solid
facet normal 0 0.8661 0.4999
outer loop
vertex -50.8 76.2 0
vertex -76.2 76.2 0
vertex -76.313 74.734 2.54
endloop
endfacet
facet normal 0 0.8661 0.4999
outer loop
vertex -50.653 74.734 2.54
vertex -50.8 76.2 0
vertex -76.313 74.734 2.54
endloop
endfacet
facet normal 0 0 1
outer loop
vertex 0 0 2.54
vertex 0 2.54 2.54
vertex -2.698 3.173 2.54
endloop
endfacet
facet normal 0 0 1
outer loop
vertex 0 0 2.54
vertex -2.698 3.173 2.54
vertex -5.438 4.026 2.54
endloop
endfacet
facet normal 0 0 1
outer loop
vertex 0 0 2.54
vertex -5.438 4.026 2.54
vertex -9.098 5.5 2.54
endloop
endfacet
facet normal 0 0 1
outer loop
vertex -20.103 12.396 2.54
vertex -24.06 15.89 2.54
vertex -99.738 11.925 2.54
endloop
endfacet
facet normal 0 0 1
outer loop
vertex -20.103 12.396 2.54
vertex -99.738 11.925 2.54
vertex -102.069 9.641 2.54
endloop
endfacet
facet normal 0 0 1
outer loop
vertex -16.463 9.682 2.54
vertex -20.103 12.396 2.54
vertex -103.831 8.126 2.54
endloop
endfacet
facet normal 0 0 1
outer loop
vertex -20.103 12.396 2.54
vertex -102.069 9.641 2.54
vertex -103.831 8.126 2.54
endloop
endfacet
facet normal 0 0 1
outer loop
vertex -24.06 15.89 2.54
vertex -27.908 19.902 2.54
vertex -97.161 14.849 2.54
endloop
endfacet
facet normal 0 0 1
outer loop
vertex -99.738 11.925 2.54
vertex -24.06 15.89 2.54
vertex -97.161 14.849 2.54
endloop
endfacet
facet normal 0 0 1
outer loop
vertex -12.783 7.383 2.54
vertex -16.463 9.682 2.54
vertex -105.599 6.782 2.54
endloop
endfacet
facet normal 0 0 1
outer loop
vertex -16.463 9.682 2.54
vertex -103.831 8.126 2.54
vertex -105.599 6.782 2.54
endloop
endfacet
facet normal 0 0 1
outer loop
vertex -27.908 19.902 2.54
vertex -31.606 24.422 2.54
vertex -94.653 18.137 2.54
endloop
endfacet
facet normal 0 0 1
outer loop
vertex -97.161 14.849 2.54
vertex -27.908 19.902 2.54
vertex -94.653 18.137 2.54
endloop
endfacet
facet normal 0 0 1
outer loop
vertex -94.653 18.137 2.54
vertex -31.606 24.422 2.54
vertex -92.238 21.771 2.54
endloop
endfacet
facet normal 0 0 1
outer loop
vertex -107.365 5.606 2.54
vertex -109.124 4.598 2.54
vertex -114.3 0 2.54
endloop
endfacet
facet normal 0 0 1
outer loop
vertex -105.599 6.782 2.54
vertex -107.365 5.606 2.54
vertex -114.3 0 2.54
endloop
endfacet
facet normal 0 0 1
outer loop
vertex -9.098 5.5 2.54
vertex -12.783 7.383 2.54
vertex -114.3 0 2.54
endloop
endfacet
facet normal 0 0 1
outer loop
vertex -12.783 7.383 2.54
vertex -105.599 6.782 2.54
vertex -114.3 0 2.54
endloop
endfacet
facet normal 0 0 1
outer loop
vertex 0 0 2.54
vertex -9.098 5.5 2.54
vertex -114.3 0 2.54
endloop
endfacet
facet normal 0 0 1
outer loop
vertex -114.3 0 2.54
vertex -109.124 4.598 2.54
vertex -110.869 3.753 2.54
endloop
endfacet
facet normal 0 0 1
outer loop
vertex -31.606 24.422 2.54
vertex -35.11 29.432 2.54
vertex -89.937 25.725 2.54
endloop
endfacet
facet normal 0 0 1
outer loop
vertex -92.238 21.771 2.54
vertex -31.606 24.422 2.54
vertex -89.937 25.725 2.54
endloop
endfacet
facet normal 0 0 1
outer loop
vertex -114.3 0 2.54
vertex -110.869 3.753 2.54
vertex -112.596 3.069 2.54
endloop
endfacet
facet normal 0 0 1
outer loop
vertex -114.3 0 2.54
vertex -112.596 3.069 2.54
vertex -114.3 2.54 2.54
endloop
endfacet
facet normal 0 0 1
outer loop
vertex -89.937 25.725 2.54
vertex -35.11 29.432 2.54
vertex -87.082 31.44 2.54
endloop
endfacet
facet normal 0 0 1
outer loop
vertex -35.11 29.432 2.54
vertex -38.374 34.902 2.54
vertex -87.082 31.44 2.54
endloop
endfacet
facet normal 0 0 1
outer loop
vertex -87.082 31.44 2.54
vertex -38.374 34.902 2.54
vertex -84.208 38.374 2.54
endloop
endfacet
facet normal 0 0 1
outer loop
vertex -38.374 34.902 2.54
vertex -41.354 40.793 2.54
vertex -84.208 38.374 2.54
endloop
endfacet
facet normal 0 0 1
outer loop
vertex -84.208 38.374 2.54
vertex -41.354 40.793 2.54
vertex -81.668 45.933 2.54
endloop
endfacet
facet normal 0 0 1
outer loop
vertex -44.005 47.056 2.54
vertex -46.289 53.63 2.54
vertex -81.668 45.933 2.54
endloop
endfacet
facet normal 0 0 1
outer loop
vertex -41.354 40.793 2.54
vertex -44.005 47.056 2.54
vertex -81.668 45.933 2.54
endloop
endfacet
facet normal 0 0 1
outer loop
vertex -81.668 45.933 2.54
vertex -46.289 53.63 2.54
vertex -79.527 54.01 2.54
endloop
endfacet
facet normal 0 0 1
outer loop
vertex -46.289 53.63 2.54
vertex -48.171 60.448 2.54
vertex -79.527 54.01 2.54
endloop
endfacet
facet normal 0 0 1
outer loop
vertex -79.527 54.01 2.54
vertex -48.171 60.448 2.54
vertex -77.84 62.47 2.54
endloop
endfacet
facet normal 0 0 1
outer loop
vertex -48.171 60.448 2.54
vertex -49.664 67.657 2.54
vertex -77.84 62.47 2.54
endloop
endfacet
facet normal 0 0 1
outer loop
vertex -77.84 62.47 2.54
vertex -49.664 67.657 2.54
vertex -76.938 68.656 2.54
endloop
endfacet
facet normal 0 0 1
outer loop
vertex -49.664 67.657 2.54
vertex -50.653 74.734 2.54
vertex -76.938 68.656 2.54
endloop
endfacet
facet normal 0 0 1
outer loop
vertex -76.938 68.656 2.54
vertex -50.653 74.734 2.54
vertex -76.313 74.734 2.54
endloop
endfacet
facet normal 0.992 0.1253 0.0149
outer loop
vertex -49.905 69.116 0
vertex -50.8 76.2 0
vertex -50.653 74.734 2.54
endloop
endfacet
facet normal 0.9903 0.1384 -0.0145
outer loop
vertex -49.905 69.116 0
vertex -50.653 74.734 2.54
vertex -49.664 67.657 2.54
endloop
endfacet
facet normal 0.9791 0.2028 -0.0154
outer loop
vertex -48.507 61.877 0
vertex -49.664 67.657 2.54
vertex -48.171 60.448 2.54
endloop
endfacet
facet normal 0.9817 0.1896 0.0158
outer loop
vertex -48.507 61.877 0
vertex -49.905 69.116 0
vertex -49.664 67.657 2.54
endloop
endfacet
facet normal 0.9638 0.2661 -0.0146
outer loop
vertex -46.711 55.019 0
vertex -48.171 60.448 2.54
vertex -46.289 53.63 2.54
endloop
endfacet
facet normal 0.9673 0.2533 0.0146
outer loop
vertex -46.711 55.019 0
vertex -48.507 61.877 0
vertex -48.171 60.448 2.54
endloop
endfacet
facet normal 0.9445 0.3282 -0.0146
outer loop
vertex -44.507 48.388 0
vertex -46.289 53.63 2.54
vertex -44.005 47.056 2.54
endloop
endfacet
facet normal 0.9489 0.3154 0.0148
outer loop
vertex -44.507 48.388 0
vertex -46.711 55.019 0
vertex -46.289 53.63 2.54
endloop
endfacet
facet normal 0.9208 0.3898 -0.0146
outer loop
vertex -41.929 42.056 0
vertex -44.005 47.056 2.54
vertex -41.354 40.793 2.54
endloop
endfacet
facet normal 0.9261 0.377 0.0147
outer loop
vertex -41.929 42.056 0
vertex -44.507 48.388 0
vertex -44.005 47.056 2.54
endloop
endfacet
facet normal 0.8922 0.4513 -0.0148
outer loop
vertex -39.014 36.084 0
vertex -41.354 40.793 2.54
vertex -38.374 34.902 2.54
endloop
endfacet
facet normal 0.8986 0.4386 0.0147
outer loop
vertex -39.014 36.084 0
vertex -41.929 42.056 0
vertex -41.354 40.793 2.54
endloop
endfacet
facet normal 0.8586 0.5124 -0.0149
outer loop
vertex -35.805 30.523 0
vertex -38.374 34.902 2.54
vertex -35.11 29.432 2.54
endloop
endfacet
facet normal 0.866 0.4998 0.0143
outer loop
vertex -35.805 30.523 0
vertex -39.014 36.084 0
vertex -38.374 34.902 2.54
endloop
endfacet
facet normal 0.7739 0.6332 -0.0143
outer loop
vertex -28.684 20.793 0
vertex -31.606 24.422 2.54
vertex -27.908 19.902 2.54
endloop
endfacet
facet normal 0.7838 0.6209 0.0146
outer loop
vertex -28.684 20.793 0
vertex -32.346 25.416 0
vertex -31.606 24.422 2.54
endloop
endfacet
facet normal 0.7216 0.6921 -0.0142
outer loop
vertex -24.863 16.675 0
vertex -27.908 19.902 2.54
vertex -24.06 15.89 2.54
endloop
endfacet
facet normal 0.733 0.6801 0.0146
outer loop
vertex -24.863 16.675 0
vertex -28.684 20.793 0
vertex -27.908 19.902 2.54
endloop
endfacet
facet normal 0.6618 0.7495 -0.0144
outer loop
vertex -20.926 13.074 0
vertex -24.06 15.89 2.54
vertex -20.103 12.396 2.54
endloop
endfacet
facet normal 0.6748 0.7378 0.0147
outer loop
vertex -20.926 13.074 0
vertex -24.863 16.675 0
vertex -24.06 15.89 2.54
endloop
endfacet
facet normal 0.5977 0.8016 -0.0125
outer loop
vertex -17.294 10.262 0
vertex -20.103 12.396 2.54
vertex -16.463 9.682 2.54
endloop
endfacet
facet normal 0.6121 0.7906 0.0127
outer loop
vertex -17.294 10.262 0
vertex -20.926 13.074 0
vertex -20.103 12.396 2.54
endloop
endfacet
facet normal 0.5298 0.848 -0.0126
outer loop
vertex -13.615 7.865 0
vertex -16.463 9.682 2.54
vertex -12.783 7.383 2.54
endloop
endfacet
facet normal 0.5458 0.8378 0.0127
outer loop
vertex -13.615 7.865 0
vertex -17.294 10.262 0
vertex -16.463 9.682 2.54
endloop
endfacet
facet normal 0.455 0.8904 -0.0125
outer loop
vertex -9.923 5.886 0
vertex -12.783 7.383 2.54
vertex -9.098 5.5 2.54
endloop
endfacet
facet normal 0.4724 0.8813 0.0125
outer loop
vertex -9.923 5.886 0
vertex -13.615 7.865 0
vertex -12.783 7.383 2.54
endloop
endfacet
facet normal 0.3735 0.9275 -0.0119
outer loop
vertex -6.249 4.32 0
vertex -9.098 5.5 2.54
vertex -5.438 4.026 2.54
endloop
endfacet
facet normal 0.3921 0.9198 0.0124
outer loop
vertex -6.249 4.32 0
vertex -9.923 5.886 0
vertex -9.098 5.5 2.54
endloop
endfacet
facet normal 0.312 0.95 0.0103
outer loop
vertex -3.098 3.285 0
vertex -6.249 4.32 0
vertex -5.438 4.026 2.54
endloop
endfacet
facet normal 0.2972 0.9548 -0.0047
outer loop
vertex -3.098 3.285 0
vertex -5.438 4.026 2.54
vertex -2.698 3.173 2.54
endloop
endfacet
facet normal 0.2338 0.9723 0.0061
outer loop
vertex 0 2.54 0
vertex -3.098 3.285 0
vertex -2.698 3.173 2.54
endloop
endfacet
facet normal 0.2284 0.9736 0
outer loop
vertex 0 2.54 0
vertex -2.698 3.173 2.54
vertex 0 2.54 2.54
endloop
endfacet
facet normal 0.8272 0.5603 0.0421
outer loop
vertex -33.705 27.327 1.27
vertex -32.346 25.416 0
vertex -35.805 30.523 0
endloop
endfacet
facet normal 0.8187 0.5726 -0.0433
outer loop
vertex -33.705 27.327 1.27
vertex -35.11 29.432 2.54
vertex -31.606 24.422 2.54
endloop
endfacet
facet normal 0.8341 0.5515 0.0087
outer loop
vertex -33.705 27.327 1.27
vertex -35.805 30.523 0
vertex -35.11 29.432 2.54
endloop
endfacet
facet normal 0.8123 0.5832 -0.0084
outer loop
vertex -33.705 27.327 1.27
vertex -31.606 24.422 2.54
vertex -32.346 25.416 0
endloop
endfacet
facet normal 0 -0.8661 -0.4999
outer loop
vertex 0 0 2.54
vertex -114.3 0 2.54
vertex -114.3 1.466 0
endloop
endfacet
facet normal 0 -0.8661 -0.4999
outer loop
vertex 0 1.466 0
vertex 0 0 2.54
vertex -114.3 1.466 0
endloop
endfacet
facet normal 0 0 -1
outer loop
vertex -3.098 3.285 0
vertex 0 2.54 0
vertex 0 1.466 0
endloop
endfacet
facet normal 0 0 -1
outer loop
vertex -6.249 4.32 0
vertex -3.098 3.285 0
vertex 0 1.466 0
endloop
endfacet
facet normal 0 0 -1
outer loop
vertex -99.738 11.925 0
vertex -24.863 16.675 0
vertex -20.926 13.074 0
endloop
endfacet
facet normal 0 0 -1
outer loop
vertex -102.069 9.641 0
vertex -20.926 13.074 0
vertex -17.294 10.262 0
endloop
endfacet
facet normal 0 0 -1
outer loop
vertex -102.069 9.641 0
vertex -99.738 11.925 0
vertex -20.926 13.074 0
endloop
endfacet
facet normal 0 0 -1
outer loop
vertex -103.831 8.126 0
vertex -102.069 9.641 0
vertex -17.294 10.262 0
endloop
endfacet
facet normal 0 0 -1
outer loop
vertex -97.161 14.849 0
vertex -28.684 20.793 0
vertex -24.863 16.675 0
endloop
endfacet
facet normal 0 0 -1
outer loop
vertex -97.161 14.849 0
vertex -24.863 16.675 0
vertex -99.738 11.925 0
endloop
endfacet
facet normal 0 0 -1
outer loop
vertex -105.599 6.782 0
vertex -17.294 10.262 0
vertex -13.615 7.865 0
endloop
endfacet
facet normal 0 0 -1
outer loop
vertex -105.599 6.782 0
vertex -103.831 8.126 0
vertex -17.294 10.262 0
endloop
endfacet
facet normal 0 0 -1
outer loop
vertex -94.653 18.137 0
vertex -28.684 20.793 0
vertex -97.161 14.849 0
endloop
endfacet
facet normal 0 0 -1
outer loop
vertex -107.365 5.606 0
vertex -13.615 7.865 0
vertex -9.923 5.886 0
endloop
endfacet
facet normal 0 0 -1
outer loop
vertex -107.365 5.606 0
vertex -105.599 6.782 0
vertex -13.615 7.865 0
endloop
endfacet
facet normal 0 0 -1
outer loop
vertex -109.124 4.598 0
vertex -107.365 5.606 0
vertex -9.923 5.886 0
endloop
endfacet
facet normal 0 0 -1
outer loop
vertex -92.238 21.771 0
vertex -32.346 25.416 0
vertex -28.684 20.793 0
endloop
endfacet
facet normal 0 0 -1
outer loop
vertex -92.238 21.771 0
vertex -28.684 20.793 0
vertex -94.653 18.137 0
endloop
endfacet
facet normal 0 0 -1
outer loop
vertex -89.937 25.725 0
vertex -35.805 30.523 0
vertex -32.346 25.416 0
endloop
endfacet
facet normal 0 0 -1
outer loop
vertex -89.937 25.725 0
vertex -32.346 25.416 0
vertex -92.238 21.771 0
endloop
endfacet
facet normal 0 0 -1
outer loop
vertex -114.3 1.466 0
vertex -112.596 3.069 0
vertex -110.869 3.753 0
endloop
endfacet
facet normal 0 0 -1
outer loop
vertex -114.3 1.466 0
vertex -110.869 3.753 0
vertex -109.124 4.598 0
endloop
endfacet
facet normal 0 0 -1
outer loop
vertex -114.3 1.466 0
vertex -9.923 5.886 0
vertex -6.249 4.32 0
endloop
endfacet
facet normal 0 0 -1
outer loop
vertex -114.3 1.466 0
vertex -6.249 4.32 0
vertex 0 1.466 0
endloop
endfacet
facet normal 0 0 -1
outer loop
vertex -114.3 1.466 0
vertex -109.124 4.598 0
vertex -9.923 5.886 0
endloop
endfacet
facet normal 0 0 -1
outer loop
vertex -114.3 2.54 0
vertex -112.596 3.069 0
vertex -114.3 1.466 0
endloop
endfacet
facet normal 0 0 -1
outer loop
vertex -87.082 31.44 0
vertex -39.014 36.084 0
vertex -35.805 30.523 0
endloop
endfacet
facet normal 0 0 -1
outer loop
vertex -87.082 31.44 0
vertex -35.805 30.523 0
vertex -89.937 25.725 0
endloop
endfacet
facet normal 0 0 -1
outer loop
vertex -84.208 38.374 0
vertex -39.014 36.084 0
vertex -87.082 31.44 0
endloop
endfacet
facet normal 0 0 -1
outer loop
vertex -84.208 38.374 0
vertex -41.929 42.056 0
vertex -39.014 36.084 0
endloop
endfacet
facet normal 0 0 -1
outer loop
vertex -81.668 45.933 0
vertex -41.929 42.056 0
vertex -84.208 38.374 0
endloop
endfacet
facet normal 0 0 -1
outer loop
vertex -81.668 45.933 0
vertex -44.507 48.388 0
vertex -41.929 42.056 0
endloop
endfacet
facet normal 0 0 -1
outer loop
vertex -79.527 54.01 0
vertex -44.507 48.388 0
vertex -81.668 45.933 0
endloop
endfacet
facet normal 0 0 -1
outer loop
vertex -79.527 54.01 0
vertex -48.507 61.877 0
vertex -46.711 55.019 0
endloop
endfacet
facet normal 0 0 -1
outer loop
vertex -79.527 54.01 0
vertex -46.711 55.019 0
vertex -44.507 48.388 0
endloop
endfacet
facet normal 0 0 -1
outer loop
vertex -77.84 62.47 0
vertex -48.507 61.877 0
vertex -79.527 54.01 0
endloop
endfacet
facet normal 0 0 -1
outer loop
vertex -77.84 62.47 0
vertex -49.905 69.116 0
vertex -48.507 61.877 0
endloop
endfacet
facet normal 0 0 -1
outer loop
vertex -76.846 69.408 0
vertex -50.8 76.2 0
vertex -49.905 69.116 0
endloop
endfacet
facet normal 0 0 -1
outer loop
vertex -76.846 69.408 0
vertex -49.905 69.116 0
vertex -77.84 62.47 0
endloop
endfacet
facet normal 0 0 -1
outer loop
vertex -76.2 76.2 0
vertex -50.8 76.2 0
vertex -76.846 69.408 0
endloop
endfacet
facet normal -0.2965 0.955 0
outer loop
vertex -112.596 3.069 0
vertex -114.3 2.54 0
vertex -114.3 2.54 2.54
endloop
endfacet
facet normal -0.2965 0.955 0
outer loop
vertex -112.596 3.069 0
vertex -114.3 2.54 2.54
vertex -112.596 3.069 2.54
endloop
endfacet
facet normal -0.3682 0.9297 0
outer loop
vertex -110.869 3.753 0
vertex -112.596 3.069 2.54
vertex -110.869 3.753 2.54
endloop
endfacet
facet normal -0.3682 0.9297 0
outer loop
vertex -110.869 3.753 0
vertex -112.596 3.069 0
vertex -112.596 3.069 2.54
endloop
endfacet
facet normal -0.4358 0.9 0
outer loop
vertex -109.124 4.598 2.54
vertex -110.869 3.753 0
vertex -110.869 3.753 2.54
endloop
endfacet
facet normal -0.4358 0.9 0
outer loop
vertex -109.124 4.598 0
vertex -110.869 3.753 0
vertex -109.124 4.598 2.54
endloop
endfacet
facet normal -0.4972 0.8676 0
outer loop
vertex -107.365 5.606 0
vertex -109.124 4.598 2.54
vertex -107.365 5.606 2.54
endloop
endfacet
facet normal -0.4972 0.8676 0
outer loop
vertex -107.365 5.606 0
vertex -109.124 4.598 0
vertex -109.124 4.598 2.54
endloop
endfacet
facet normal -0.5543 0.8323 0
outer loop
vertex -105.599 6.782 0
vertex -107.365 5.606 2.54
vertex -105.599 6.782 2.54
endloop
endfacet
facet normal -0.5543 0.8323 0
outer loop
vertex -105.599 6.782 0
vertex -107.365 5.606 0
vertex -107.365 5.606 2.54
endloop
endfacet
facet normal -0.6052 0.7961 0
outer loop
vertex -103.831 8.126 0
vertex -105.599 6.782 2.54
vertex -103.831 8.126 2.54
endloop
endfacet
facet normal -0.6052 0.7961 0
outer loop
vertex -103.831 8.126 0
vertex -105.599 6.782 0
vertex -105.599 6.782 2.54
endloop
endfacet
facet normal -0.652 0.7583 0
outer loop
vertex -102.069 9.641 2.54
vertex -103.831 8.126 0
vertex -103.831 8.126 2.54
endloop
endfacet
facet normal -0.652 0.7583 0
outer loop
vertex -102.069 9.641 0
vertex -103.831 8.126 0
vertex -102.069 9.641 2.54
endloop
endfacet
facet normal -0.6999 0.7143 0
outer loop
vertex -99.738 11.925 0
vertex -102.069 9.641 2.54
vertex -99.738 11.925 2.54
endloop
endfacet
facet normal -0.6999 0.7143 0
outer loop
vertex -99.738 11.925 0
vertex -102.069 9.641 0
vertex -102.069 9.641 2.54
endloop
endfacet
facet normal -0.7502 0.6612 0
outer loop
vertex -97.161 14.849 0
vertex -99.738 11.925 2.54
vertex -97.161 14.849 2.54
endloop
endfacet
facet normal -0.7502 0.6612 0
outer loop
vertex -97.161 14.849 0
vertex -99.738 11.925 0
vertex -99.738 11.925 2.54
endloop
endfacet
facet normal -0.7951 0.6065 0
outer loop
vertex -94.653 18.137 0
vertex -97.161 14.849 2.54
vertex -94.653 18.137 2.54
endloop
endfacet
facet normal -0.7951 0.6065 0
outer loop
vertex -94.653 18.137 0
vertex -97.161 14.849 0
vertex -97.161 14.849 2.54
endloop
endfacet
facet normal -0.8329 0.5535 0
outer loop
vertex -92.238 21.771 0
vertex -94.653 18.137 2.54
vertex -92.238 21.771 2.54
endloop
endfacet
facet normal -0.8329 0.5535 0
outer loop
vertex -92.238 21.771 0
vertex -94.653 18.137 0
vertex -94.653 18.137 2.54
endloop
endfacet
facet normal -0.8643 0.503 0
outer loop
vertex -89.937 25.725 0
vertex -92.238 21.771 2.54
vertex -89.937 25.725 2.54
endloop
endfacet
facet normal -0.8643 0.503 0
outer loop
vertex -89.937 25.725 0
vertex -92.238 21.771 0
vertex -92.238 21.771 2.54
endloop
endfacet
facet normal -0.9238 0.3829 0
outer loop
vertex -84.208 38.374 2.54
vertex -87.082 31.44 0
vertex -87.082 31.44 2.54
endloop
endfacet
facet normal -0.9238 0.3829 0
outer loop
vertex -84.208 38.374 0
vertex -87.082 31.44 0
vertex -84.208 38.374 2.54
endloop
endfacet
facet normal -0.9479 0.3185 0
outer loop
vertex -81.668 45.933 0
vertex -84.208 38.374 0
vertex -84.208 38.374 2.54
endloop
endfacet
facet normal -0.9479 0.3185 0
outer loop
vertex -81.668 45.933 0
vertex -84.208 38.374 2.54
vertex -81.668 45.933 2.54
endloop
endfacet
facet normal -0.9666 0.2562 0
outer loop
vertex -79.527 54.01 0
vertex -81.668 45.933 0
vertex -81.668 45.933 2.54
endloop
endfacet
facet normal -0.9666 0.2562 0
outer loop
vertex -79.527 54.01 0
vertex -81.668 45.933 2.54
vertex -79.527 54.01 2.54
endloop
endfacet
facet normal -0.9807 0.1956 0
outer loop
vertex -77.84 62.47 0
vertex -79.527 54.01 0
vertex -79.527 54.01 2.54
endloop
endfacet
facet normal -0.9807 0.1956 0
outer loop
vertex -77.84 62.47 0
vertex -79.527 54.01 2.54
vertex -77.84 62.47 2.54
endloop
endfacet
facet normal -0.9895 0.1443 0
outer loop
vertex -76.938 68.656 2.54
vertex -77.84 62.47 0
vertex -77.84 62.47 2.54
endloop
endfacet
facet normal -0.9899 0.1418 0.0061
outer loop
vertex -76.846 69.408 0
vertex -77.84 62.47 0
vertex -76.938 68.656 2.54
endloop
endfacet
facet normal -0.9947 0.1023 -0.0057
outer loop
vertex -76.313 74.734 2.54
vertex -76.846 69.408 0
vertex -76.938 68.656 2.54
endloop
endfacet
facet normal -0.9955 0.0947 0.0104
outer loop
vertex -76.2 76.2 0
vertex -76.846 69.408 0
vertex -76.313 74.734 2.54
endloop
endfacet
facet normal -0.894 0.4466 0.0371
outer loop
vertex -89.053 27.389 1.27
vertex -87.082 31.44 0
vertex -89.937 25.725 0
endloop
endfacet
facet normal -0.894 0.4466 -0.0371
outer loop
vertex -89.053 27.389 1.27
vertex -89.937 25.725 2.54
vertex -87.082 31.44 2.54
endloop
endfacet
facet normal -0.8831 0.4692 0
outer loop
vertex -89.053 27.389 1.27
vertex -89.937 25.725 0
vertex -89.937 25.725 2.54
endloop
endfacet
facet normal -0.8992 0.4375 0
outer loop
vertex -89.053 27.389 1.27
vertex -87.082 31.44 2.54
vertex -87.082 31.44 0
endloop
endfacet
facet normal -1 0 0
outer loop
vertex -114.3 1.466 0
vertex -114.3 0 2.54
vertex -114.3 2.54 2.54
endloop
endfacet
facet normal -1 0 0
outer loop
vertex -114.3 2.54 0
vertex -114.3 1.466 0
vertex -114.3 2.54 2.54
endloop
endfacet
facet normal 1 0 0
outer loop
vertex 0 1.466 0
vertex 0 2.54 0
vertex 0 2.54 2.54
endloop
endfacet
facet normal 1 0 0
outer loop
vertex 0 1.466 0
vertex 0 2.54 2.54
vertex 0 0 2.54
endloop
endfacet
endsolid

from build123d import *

# Parameters (mm, degrees)
BOSS_EXTRUDE1_DEPTH = 2.54
CUT_EXTRUDE3_REACH  = 139.395
CUT_EXTRUDE4_DEPTH  = 77.978


with BuildPart() as part:
    # Sketch1 → Boss-Extrude1 (new body)
    with BuildSketch(Plane.XY):
        with BuildLine():
            Line((0, 0), (-114.3, 0))
            Line((-114.3, 0), (-114.3, 2.54))
            add(Edge.make_bspline(
                [(-114.3, 2.54), (-80.840252574, 11.511154975), (-76.2, 76.2)],
                knots=[0.188439876, 0.188439876, 0.188439876, 1.620106138, 1.620106138, 1.620106138], degree=2, weights=[1, 0.754546764, 1]))
            Line((-76.2, 76.2), (-50.8, 76.2))
            add(Edge.make_bspline(
                [(-50.8, 76.2), (-44.726222493, 11.346977385), (0, 2.54)],
                knots=[4.596431231, 4.596431231, 4.596431231, 6.031007642, 6.031007642, 6.031007642], degree=2, weights=[1, 0.753591079, 1]))
            Line((0, 2.54), (0, 0))
        make_face()
    extrude(amount=BOSS_EXTRUDE1_DEPTH)

    # Sketch4 → Cut-Extrude3 (cut, up to next)
    with BuildSketch(Plane.ZY.offset(114.3), mode=Mode.PRIVATE) as cut_extrude3_sk1:
        Polygon((2.54, 0), (0, 1.466469684), (0, 0), align=None)
    cut_extrude3_tool1 = extrude(cut_extrude3_sk1.sketch, amount=-CUT_EXTRUDE3_REACH, mode=Mode.PRIVATE) & part.part
    add(cut_extrude3_tool1.solids().sort_by_distance((-114.3, 0.488823, 0.846667))[0], mode=Mode.SUBTRACT)

    # Sketch5 → Cut-Extrude4 (cut)
    with BuildSketch(Plane.ZY.offset(114.3)):
        Polygon((0, 76.2), (2.54, 74.733530316), (2.54, 76.2), align=None)
    extrude(amount=-CUT_EXTRUDE4_DEPTH, mode=Mode.SUBTRACT)


solid = part.part
